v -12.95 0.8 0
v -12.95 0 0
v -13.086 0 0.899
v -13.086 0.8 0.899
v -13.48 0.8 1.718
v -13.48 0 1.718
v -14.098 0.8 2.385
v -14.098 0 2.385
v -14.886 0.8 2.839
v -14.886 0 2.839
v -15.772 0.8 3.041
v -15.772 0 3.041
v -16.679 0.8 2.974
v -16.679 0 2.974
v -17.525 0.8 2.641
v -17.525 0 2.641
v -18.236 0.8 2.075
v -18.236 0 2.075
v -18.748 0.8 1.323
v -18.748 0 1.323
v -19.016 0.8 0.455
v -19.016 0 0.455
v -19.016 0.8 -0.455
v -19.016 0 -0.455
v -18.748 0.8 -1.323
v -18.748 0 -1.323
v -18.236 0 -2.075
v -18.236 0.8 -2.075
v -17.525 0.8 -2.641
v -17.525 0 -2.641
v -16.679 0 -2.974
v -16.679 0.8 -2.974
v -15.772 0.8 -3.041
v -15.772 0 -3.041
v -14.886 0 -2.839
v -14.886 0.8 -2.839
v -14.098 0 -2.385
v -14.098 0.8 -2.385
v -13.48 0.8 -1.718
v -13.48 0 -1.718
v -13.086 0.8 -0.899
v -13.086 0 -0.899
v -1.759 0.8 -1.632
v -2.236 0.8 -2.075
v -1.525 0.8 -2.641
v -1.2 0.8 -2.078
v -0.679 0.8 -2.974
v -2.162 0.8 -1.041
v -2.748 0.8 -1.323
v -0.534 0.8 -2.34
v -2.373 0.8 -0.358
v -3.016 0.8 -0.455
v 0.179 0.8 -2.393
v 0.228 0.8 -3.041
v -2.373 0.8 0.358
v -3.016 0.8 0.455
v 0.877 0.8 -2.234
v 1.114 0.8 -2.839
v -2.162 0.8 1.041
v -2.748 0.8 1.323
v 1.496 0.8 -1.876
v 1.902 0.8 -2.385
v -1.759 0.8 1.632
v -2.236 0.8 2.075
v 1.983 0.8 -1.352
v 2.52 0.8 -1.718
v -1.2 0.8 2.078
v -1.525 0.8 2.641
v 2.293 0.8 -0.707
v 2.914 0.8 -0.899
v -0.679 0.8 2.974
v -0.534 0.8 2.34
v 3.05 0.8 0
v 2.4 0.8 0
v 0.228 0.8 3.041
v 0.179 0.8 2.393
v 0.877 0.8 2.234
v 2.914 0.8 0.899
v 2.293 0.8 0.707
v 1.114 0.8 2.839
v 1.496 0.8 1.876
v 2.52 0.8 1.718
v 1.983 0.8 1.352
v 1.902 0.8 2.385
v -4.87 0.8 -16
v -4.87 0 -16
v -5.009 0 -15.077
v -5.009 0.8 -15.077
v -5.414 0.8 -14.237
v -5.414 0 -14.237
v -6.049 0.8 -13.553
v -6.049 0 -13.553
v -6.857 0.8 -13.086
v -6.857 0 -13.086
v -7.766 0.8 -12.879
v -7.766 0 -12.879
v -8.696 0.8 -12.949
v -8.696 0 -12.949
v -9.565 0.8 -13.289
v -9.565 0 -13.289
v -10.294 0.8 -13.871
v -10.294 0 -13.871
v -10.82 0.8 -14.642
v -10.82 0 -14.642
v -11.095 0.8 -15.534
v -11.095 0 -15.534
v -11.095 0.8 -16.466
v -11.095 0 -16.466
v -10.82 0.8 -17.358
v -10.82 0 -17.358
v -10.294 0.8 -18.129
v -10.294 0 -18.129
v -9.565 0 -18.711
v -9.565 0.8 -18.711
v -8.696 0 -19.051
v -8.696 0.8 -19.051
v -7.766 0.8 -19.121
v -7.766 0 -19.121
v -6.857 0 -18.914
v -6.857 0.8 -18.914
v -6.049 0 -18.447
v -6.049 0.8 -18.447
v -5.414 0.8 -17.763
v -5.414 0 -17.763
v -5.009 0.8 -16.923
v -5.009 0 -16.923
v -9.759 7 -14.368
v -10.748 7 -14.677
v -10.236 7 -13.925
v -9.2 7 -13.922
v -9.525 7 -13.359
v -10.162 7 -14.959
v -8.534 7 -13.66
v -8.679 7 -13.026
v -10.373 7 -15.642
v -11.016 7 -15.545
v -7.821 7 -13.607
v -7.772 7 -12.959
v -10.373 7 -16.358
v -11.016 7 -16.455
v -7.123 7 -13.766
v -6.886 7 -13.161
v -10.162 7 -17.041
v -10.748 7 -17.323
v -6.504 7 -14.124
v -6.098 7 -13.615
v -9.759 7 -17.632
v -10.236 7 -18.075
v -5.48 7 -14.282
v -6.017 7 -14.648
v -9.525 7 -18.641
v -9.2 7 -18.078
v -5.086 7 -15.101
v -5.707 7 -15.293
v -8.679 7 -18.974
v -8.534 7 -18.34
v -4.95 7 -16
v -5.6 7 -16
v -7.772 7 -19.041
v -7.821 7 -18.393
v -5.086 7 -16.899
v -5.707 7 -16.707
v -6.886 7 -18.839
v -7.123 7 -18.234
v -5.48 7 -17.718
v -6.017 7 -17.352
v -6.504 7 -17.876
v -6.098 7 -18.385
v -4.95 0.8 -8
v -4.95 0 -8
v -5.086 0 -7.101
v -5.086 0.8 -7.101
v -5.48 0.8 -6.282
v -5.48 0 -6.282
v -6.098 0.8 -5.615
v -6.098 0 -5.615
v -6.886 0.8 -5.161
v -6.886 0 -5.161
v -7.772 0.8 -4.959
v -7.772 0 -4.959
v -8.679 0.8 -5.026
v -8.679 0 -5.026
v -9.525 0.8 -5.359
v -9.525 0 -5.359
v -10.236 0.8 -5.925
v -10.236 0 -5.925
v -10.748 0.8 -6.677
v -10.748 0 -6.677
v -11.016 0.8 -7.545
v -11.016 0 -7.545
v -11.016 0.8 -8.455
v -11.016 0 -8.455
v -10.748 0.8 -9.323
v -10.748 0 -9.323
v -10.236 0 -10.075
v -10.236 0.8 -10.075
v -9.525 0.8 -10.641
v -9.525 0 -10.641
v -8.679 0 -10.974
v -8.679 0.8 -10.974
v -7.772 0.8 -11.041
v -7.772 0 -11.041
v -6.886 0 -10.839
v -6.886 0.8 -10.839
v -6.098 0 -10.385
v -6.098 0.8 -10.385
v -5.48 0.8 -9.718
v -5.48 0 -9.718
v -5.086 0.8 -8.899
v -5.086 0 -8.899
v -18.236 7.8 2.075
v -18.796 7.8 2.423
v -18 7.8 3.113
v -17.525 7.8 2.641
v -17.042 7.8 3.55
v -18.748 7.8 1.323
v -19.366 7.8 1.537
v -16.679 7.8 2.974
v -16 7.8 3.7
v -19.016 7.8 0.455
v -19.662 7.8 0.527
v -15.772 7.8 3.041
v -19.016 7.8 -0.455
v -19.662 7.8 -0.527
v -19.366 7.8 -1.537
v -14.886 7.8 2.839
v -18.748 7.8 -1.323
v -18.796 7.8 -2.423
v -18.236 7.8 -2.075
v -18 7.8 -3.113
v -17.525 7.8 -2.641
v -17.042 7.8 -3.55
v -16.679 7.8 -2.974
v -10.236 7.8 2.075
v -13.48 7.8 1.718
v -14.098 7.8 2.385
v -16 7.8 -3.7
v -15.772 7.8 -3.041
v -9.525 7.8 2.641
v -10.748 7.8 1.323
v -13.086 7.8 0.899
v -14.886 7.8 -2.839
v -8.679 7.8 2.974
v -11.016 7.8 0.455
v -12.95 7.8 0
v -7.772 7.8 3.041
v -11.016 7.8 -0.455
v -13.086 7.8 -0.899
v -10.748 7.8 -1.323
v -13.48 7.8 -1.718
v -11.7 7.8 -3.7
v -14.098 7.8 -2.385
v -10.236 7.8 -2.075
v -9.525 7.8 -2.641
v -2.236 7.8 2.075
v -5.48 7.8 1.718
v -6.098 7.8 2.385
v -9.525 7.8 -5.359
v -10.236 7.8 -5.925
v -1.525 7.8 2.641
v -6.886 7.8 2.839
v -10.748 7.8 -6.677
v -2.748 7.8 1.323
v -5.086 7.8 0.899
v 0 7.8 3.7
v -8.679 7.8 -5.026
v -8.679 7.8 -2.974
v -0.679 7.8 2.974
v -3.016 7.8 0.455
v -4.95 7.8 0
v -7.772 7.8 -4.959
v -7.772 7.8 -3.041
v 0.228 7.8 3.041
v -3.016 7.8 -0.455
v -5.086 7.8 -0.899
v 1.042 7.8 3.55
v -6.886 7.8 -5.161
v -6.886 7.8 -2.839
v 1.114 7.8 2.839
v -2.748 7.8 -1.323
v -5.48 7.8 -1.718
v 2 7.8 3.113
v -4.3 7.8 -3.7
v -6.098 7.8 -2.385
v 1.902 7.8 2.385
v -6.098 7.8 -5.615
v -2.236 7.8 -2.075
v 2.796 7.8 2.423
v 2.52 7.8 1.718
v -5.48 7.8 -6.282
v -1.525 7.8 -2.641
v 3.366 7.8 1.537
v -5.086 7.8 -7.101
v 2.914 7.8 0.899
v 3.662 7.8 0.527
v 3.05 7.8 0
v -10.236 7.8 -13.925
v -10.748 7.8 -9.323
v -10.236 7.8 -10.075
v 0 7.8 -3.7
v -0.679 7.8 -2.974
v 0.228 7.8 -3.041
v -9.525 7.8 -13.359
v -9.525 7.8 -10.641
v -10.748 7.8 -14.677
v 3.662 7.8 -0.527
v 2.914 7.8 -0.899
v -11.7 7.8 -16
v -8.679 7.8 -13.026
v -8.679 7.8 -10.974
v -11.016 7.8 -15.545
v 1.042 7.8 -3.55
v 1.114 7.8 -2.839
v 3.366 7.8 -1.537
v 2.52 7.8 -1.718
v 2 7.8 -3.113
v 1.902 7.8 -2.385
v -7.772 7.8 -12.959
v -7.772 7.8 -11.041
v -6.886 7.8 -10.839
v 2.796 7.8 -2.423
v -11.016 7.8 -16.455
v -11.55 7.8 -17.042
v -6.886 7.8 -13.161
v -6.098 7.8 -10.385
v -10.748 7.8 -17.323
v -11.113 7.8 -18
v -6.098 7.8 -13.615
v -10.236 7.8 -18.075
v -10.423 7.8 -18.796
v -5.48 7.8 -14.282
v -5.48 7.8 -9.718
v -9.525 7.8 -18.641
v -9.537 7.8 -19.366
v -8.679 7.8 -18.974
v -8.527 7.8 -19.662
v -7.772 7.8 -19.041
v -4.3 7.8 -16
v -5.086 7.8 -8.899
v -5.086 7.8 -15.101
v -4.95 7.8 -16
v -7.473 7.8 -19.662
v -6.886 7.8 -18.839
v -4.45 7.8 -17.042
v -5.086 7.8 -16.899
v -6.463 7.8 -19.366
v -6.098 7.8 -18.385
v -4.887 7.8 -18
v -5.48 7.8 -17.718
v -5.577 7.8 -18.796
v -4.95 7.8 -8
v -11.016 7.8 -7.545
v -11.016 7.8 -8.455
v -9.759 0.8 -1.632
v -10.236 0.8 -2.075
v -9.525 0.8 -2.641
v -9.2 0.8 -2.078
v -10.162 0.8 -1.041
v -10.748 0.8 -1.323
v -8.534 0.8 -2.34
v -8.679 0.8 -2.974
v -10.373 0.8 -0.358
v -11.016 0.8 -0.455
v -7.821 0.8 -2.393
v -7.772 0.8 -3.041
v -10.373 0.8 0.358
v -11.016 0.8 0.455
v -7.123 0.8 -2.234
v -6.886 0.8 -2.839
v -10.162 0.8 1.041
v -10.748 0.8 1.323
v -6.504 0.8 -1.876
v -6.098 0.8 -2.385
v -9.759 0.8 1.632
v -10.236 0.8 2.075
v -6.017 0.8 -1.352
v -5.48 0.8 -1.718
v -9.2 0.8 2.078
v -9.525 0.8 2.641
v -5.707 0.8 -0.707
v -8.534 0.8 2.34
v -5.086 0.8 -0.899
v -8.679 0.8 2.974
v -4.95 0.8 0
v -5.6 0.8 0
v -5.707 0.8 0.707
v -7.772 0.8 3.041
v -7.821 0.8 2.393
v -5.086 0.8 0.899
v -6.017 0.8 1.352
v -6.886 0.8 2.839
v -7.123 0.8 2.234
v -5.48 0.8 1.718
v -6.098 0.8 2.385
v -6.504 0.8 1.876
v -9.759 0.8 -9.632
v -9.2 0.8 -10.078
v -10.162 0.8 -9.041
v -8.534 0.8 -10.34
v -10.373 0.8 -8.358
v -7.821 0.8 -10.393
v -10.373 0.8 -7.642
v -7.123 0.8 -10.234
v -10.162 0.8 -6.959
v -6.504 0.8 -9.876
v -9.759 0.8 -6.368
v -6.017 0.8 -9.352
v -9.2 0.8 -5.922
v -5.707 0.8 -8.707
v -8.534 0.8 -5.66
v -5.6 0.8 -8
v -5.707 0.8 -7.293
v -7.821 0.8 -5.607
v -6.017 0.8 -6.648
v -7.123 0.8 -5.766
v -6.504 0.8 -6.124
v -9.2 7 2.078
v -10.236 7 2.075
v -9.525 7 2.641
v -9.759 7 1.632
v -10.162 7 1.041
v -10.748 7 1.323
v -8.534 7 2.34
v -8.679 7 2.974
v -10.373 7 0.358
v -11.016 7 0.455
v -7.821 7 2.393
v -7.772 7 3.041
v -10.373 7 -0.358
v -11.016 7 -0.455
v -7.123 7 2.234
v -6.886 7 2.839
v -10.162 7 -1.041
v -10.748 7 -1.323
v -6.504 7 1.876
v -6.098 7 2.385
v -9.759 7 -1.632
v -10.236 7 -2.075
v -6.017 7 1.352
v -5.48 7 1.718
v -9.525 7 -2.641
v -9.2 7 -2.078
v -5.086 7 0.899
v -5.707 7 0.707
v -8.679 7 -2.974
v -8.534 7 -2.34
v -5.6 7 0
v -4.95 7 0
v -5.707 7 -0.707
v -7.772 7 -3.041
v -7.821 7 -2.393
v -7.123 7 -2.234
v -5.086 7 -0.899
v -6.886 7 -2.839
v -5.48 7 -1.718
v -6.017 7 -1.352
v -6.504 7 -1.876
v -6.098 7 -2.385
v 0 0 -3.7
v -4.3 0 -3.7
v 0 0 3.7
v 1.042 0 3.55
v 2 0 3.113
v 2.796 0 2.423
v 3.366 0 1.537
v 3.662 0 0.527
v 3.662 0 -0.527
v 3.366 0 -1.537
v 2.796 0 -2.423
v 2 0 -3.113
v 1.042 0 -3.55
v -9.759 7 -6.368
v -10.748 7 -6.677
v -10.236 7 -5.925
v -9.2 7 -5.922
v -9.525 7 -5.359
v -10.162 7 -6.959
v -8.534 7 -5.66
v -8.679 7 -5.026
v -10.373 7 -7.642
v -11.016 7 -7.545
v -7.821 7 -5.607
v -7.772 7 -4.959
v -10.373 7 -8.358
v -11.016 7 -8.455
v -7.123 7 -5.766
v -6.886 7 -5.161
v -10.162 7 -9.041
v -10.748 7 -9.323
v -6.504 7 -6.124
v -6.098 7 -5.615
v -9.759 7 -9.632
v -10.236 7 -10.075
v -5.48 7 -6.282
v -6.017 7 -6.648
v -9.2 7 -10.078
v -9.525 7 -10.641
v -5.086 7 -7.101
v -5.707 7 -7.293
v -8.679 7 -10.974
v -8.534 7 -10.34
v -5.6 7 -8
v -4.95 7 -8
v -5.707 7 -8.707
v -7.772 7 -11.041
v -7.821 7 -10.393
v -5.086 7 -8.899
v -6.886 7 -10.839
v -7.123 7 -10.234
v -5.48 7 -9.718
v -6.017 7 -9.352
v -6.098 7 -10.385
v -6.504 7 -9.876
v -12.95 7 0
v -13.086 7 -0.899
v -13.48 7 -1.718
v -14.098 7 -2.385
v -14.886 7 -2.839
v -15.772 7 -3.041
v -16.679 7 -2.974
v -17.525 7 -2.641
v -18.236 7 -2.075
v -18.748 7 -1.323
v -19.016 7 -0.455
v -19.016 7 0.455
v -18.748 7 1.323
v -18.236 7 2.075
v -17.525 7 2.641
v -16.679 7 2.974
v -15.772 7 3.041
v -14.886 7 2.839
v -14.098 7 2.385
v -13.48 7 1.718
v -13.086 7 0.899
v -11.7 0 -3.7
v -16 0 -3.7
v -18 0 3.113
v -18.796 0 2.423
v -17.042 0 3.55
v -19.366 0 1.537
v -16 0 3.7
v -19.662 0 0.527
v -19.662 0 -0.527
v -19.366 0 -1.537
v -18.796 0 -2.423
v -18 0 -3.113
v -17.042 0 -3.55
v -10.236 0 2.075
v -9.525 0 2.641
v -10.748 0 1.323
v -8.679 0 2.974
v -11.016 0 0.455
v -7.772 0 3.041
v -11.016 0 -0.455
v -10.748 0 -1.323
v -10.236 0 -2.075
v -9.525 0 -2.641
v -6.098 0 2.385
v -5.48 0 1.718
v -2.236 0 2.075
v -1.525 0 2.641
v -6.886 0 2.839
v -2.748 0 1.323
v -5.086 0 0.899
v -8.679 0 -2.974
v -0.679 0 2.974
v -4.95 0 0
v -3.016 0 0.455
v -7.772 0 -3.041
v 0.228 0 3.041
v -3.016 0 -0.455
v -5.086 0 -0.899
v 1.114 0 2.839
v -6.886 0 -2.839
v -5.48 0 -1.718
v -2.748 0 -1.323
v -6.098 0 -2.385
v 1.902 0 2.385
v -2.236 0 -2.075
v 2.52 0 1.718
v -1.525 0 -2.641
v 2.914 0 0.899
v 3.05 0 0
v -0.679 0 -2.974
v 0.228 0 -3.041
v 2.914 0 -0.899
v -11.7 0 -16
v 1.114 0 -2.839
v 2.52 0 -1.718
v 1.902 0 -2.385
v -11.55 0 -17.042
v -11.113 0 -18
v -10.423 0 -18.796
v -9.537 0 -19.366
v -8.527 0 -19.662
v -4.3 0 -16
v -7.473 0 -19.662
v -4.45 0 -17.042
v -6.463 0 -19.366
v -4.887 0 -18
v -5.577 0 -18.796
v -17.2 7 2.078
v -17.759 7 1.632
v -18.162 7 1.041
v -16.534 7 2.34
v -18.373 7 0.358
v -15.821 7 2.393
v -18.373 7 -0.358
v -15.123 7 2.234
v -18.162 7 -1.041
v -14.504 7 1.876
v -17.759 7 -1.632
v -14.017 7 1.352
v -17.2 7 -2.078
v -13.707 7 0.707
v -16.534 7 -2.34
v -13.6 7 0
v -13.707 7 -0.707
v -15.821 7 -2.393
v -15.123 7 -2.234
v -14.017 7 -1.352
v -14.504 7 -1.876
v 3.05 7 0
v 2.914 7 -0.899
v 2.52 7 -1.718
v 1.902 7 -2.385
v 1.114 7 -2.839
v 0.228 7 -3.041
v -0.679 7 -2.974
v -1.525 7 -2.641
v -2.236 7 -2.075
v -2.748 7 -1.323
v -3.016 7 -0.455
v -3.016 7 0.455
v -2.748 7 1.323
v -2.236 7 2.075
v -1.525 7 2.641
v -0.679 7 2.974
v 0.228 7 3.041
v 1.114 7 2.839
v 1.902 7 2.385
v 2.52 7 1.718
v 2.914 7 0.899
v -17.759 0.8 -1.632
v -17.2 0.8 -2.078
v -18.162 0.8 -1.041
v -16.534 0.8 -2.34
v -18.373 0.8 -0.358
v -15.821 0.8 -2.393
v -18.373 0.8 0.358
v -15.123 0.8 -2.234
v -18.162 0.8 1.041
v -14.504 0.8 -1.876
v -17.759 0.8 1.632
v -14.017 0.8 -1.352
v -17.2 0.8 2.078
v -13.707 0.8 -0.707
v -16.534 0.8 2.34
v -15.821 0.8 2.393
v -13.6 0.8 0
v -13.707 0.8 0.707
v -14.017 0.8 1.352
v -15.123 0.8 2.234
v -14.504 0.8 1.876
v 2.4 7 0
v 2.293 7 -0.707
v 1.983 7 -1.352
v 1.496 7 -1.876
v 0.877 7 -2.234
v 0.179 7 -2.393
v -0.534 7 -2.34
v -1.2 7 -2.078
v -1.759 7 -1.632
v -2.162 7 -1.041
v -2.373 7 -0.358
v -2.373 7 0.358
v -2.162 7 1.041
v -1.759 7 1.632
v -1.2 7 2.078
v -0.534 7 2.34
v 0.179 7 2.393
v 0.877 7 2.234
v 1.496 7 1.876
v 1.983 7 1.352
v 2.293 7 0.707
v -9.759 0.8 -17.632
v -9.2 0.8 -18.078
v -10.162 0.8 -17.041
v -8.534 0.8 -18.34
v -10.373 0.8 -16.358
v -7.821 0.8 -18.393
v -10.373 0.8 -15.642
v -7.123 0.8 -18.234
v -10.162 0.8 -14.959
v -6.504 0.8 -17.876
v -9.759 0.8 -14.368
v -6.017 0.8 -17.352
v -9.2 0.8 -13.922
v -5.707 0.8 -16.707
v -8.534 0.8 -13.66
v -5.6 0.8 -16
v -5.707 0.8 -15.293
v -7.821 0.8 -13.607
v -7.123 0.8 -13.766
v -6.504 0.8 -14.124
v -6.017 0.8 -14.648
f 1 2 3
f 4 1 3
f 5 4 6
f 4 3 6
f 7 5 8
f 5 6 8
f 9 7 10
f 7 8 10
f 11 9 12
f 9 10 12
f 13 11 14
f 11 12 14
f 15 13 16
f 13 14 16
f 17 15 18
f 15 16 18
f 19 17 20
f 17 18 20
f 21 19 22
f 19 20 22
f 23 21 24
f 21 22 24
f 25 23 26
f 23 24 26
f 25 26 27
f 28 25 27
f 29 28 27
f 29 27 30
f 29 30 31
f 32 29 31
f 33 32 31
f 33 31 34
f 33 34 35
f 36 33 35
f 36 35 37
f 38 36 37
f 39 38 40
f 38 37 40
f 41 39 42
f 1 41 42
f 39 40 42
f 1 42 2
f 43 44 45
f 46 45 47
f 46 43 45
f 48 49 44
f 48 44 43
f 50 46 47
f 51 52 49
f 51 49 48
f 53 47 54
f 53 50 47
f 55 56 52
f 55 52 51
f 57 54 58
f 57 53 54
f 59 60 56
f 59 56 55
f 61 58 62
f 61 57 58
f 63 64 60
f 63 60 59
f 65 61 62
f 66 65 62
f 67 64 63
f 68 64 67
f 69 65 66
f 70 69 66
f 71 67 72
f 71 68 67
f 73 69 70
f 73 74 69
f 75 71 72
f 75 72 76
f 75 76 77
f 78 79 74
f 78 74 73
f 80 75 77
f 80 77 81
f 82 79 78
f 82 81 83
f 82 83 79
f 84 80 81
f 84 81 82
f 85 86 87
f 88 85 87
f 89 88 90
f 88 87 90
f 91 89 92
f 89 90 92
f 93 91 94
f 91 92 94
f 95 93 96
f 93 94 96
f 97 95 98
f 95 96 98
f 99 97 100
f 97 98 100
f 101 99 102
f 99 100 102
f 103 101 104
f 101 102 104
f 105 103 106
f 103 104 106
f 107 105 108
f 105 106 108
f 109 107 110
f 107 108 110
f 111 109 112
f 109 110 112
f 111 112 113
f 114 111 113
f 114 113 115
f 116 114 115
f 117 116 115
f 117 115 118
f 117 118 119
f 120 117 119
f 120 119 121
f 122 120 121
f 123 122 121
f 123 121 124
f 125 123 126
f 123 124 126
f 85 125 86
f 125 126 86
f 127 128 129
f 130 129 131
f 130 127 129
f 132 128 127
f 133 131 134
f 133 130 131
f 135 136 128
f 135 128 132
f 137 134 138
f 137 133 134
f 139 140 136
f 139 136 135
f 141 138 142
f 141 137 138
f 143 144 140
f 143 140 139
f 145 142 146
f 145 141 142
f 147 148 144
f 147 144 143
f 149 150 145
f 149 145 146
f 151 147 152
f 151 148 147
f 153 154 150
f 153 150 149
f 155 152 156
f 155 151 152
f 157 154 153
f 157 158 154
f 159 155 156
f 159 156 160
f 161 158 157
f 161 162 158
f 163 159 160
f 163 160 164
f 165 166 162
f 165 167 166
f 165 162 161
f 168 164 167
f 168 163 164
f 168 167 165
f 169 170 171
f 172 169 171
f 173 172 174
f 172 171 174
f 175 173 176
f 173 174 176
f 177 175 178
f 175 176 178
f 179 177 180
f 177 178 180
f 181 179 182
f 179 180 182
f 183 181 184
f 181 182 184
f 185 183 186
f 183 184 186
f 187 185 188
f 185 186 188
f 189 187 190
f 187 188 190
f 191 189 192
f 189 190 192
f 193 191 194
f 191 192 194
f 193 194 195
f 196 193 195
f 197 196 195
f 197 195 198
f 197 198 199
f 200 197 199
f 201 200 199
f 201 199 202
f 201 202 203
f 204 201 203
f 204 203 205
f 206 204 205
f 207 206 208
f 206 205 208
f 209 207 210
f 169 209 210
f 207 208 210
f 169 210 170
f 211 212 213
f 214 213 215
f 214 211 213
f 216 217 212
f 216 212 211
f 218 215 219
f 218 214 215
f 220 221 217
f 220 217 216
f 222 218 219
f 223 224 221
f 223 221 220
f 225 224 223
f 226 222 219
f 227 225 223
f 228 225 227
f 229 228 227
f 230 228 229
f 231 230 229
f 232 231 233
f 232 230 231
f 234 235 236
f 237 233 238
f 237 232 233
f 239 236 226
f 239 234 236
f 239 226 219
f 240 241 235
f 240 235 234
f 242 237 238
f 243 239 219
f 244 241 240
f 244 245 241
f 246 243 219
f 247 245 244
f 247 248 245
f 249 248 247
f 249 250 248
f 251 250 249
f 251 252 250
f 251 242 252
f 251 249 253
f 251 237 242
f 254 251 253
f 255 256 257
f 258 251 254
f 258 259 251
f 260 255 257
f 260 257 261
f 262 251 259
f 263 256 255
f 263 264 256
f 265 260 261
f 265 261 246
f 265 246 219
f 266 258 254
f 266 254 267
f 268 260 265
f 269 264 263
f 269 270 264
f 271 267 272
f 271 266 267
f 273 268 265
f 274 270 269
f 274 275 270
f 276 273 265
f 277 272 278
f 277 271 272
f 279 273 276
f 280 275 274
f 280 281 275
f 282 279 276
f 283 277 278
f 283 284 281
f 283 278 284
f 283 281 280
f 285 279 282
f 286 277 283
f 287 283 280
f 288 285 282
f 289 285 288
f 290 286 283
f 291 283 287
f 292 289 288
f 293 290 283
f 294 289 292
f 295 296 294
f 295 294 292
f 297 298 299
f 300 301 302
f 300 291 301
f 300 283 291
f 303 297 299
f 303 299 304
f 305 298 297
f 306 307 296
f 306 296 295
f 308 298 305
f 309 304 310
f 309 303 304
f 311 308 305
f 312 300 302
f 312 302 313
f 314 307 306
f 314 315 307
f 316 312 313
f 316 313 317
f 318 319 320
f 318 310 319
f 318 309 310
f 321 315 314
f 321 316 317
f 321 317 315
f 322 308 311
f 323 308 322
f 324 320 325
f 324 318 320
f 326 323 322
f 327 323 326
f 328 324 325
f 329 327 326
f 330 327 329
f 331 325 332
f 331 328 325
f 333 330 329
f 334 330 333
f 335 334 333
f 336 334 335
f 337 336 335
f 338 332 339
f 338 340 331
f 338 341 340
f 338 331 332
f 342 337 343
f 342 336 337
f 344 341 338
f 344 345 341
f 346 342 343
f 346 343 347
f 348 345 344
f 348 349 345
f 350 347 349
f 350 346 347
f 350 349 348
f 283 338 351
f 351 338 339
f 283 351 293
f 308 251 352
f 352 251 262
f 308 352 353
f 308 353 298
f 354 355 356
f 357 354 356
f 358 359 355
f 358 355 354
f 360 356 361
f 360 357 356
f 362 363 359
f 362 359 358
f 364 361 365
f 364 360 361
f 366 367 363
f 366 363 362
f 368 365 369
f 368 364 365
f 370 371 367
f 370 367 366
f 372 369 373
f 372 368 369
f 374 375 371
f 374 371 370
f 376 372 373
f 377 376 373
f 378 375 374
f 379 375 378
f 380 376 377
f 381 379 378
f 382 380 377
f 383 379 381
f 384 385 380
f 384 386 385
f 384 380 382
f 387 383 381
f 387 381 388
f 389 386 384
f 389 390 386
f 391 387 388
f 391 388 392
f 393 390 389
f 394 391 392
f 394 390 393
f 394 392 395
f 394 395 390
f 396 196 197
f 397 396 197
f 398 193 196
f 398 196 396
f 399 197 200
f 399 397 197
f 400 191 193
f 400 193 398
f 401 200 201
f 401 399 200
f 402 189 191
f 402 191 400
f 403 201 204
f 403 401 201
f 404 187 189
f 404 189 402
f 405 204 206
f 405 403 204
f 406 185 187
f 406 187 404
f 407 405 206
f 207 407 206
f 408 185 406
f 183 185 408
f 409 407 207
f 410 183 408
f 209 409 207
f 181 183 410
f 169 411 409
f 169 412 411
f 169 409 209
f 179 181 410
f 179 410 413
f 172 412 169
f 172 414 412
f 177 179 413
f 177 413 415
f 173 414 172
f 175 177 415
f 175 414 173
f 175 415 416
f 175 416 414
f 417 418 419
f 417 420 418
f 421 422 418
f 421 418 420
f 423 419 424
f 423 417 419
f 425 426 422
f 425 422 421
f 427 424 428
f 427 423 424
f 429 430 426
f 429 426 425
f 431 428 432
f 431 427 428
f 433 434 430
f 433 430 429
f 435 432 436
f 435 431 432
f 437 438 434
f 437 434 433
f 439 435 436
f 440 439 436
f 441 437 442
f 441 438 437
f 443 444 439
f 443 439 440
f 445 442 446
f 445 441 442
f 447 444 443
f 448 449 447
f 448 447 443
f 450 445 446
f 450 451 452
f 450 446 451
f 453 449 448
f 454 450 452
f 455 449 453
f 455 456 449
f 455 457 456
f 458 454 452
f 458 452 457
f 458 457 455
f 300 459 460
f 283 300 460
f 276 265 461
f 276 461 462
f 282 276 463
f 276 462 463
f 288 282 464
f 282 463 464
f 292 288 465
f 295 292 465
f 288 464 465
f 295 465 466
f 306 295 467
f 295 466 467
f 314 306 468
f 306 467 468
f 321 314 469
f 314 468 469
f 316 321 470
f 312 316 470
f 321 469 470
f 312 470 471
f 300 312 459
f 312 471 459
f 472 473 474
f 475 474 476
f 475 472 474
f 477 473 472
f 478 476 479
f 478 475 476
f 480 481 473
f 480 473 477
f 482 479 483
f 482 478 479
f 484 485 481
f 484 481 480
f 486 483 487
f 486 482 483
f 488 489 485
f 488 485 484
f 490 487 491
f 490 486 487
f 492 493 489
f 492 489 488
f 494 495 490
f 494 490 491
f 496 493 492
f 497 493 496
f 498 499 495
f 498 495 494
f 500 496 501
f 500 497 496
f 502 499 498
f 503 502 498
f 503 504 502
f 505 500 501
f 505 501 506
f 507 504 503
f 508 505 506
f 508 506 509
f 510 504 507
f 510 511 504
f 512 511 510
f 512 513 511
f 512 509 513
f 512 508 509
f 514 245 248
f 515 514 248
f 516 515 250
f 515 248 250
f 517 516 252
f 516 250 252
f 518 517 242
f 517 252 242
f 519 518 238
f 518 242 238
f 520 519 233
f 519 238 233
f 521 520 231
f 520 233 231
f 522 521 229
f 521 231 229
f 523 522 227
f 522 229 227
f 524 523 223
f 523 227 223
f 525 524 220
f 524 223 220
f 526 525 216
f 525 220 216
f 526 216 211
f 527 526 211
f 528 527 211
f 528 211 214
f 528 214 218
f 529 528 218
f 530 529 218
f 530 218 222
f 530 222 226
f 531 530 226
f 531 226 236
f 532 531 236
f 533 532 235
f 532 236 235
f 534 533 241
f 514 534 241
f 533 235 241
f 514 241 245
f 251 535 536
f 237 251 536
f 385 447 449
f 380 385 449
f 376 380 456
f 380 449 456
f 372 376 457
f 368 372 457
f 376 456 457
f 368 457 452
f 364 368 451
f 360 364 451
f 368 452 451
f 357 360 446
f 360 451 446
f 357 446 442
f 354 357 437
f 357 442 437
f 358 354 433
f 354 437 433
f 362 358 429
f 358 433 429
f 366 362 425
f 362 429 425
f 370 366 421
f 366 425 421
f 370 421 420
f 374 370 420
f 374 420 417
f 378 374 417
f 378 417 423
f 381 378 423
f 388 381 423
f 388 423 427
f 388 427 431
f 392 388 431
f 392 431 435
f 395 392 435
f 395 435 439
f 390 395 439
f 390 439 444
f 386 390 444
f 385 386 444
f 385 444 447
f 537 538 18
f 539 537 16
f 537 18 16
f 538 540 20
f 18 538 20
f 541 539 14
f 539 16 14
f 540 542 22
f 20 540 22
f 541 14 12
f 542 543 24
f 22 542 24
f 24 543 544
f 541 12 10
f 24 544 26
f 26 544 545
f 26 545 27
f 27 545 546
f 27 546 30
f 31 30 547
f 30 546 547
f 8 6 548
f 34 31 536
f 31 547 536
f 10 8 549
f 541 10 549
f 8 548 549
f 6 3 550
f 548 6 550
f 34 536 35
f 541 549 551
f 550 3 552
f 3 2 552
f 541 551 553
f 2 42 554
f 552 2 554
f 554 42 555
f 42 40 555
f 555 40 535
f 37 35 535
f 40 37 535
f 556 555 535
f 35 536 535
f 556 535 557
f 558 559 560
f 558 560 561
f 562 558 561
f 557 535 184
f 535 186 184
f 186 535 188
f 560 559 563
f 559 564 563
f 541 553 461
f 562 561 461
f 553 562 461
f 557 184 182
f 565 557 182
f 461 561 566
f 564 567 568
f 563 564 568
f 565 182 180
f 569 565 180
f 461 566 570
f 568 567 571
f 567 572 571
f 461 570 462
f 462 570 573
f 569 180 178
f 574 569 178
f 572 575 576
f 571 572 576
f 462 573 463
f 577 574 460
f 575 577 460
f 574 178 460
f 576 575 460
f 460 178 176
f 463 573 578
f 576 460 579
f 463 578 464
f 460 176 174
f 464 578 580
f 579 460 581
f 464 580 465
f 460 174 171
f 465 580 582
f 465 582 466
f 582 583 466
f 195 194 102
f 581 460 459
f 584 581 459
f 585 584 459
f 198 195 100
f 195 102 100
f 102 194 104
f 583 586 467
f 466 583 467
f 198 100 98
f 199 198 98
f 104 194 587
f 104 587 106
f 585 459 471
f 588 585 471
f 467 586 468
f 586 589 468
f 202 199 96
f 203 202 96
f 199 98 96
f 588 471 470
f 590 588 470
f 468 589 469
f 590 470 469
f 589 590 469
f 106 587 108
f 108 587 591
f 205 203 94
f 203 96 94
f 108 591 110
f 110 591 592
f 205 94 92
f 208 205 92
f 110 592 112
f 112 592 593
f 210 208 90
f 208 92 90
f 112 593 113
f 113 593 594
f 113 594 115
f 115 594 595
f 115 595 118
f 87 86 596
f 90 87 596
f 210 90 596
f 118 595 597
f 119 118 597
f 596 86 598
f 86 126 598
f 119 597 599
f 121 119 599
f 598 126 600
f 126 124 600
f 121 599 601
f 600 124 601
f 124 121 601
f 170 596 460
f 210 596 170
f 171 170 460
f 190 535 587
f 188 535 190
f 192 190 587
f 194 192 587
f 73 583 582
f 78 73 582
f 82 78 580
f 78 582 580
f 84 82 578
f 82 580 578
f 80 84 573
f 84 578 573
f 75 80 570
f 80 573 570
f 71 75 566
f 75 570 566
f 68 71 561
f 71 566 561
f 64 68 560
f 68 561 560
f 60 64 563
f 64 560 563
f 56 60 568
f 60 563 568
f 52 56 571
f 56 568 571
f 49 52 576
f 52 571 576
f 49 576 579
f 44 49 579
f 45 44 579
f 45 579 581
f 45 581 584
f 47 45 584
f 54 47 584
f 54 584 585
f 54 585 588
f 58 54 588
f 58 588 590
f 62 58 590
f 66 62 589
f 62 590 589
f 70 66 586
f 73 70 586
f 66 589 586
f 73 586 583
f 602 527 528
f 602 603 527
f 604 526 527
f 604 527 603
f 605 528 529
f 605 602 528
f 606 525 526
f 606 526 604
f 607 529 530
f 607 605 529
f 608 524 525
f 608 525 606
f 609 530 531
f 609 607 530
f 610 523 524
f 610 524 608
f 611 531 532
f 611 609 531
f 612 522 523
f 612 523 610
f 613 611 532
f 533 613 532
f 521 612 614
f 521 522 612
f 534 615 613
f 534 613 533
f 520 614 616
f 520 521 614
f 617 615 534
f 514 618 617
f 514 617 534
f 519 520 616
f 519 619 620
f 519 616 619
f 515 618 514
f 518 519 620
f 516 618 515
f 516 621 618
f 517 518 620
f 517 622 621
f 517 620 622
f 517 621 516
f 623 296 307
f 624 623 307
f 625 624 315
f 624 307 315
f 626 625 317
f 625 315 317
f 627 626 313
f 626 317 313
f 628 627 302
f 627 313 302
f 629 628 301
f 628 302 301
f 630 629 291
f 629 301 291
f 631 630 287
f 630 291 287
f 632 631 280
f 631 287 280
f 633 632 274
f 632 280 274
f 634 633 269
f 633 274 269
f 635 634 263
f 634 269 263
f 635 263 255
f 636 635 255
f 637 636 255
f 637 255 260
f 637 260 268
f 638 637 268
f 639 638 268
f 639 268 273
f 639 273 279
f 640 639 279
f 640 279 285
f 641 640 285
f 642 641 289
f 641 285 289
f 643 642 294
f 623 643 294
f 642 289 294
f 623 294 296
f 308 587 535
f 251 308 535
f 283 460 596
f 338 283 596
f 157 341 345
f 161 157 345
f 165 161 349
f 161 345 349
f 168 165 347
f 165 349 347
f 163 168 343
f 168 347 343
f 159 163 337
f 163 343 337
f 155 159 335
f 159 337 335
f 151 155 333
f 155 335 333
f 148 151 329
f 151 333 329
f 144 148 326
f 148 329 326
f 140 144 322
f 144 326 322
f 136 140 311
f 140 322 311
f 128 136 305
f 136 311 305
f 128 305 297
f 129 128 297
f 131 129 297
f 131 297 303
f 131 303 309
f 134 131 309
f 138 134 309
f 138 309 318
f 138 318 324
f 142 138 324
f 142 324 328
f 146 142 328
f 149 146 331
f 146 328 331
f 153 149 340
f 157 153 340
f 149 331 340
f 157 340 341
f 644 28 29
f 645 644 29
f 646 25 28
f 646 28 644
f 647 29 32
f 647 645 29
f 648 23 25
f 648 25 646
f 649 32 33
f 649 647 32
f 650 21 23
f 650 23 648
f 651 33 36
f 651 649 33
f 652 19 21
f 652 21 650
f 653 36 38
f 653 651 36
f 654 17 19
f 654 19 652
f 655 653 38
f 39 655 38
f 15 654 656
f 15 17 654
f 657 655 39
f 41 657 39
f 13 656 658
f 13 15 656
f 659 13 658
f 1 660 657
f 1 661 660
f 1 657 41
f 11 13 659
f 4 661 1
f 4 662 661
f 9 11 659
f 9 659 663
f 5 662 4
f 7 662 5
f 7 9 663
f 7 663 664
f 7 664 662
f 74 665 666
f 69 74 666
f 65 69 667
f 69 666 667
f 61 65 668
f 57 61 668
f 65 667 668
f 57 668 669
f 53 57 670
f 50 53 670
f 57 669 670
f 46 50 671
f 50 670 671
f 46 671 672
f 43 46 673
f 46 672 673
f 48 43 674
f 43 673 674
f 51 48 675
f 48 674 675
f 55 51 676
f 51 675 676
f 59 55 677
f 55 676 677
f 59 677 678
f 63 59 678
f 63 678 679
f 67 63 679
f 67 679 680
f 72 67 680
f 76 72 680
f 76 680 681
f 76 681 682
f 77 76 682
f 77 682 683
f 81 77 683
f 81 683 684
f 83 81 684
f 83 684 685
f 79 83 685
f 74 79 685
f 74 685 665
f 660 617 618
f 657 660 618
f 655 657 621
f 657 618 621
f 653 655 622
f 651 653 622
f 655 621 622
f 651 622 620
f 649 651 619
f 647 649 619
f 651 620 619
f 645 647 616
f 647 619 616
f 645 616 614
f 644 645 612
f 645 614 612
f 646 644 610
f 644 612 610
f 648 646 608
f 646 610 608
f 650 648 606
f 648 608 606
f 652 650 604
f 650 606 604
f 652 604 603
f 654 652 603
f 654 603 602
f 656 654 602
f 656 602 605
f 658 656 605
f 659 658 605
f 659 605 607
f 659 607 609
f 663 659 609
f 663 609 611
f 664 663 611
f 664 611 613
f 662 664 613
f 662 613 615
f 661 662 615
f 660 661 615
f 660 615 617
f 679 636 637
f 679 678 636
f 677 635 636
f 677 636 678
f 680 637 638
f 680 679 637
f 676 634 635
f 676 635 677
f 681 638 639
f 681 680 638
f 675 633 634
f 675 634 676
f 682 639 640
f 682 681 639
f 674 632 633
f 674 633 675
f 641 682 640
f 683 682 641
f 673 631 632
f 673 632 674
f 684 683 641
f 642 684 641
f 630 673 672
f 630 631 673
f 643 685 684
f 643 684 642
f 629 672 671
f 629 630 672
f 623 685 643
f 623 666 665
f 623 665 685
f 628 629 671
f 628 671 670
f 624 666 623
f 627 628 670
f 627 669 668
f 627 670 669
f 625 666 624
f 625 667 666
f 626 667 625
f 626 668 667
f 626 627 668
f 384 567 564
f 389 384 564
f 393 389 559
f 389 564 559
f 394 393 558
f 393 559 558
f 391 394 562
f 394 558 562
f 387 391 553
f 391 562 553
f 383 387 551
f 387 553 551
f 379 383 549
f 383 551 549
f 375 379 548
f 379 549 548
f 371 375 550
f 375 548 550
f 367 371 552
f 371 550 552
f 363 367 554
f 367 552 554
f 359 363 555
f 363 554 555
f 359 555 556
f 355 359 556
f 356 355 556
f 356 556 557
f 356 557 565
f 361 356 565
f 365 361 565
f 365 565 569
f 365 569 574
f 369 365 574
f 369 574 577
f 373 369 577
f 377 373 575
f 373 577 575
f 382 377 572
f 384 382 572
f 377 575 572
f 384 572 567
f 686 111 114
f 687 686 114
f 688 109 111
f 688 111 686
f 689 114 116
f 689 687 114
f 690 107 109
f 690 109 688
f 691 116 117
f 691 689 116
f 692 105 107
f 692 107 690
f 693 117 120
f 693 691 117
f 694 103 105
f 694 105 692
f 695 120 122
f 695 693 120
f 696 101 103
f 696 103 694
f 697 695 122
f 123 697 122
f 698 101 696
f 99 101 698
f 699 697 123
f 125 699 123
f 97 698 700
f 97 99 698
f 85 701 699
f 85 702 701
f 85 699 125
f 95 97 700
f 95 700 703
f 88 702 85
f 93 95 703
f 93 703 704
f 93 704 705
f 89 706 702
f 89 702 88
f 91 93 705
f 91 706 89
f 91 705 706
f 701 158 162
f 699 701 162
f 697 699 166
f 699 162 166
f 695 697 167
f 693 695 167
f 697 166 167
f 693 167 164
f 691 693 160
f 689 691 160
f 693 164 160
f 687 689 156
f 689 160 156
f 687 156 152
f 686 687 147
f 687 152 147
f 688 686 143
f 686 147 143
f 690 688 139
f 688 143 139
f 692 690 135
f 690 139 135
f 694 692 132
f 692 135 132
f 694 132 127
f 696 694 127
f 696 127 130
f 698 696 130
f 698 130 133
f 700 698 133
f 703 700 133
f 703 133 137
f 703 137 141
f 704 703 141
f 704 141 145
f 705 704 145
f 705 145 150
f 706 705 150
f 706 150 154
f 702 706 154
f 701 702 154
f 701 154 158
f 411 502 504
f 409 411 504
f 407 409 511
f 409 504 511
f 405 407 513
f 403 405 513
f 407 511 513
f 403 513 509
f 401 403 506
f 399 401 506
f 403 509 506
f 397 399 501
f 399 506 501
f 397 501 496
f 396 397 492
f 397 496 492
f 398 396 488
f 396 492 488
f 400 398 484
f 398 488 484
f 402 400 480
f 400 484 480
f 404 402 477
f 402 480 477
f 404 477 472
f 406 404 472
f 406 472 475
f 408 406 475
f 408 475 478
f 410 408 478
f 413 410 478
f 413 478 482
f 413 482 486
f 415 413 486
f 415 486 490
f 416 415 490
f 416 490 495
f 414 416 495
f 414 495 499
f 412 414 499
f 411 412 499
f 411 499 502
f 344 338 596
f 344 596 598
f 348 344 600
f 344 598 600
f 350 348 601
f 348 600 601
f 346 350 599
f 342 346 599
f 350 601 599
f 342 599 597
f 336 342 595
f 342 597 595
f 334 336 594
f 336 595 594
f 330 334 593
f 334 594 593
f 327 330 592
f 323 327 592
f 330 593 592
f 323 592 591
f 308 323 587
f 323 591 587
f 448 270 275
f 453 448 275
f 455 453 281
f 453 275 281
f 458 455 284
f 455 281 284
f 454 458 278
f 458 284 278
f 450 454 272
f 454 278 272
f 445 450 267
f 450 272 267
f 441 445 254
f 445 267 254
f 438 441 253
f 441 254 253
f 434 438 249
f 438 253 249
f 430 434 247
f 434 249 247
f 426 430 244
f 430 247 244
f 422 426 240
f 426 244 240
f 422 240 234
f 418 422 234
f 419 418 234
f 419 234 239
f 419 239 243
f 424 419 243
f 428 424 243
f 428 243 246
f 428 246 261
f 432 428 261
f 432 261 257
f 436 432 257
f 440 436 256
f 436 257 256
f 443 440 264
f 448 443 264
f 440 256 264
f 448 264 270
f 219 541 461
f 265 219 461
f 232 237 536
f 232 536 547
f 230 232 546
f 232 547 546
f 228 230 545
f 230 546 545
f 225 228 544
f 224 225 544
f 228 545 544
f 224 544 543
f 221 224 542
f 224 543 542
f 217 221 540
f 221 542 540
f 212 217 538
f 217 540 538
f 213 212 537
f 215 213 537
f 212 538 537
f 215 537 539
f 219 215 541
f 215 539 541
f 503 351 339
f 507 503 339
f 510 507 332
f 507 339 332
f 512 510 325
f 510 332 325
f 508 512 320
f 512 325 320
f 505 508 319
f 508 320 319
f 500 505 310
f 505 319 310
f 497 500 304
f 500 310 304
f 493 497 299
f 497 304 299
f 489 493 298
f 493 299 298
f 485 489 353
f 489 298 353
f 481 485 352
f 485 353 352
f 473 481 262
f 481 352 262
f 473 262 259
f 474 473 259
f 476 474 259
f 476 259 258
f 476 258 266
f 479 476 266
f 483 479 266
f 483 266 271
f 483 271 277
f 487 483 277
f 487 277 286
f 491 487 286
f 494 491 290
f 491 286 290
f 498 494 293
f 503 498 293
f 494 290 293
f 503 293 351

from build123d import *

# Parameters (mm, degrees)
BOSS_EXTRUDE3_DEPTH = 7.8
SKETCH2_R           = 2.4
CUT_EXTRUDE1_DEPTH  = 7.8
SKETCH3_R           = 3.05
CUT_EXTRUDE2_DEPTH  = 0.8
SKETCH4_R           = 3.05
SKETCH4_R_2         = 3.129900969
CUT_EXTRUDE3_DEPTH  = 0.8


with BuildPart() as part:
    # Sketch1 → Boss-Extrude3 (new body)
    with BuildSketch(Plane(origin=(0, 0, 0), x_dir=(1, 0, 0), z_dir=(0, 1, 0))):
        with BuildLine():
            Line((-16, -3.7), (0, -3.7))
            ThreePointArc((0, -3.7), (3.7, 0), (0, 3.7))
            Line((0, 3.7), (-4.3, 3.7))
            Line((-4.3, 3.7), (-4.3, 16))
            ThreePointArc((-4.3, 16), (-8, 19.7), (-11.7, 16))
            Line((-11.7, 16), (-11.7, 3.7))
            Line((-11.7, 3.7), (-16, 3.7))
            ThreePointArc((-16, 3.7), (-19.7, 0), (-16, -3.7))
        make_face()
    extrude(amount=BOSS_EXTRUDE3_DEPTH)

    # Sketch2 → Cut-Extrude1 (cut)
    with BuildSketch(Plane(origin=(0, 7.8, 0), x_dir=(1, 0, 0), z_dir=(0, 1, 0))):
        Circle(SKETCH2_R)
        with Locations((-16, 0)):
            Circle(SKETCH2_R)
        with Locations((-8, 0)):
            Circle(SKETCH2_R)
        with Locations((-8, 8)):
            Circle(SKETCH2_R)
        with Locations((-8, 16)):
            Circle(SKETCH2_R)
    extrude(amount=-CUT_EXTRUDE1_DEPTH, mode=Mode.SUBTRACT)

    # Sketch3 → Cut-Extrude2 (cut)
    with BuildSketch(Plane(origin=(0, 7.8, 0), x_dir=(1, 0, 0), z_dir=(0, 1, 0))):
        Circle(SKETCH3_R)
        with Locations((-16, 0)):
            Circle(SKETCH3_R)
        with Locations((-8, 0)):
            Circle(SKETCH3_R)
        with Locations((-8, 8)):
            Circle(SKETCH3_R)
        with Locations((-8, 16)):
            Circle(SKETCH3_R)
    extrude(amount=-CUT_EXTRUDE2_DEPTH, mode=Mode.SUBTRACT)

    # Sketch4 → Cut-Extrude3 (cut)
    with BuildSketch(Plane.XZ):
        Circle(SKETCH4_R)
        with Locations((-16, 0)):
            Circle(SKETCH4_R)
        with Locations((-8, 0)):
            Circle(SKETCH4_R)
        with Locations((-8, -16)):
            Circle(SKETCH4_R_2)
        with Locations((-8, -8)):
            Circle(SKETCH4_R)
    extrude(amount=-CUT_EXTRUDE3_DEPTH, mode=Mode.SUBTRACT)


solid = part.part
